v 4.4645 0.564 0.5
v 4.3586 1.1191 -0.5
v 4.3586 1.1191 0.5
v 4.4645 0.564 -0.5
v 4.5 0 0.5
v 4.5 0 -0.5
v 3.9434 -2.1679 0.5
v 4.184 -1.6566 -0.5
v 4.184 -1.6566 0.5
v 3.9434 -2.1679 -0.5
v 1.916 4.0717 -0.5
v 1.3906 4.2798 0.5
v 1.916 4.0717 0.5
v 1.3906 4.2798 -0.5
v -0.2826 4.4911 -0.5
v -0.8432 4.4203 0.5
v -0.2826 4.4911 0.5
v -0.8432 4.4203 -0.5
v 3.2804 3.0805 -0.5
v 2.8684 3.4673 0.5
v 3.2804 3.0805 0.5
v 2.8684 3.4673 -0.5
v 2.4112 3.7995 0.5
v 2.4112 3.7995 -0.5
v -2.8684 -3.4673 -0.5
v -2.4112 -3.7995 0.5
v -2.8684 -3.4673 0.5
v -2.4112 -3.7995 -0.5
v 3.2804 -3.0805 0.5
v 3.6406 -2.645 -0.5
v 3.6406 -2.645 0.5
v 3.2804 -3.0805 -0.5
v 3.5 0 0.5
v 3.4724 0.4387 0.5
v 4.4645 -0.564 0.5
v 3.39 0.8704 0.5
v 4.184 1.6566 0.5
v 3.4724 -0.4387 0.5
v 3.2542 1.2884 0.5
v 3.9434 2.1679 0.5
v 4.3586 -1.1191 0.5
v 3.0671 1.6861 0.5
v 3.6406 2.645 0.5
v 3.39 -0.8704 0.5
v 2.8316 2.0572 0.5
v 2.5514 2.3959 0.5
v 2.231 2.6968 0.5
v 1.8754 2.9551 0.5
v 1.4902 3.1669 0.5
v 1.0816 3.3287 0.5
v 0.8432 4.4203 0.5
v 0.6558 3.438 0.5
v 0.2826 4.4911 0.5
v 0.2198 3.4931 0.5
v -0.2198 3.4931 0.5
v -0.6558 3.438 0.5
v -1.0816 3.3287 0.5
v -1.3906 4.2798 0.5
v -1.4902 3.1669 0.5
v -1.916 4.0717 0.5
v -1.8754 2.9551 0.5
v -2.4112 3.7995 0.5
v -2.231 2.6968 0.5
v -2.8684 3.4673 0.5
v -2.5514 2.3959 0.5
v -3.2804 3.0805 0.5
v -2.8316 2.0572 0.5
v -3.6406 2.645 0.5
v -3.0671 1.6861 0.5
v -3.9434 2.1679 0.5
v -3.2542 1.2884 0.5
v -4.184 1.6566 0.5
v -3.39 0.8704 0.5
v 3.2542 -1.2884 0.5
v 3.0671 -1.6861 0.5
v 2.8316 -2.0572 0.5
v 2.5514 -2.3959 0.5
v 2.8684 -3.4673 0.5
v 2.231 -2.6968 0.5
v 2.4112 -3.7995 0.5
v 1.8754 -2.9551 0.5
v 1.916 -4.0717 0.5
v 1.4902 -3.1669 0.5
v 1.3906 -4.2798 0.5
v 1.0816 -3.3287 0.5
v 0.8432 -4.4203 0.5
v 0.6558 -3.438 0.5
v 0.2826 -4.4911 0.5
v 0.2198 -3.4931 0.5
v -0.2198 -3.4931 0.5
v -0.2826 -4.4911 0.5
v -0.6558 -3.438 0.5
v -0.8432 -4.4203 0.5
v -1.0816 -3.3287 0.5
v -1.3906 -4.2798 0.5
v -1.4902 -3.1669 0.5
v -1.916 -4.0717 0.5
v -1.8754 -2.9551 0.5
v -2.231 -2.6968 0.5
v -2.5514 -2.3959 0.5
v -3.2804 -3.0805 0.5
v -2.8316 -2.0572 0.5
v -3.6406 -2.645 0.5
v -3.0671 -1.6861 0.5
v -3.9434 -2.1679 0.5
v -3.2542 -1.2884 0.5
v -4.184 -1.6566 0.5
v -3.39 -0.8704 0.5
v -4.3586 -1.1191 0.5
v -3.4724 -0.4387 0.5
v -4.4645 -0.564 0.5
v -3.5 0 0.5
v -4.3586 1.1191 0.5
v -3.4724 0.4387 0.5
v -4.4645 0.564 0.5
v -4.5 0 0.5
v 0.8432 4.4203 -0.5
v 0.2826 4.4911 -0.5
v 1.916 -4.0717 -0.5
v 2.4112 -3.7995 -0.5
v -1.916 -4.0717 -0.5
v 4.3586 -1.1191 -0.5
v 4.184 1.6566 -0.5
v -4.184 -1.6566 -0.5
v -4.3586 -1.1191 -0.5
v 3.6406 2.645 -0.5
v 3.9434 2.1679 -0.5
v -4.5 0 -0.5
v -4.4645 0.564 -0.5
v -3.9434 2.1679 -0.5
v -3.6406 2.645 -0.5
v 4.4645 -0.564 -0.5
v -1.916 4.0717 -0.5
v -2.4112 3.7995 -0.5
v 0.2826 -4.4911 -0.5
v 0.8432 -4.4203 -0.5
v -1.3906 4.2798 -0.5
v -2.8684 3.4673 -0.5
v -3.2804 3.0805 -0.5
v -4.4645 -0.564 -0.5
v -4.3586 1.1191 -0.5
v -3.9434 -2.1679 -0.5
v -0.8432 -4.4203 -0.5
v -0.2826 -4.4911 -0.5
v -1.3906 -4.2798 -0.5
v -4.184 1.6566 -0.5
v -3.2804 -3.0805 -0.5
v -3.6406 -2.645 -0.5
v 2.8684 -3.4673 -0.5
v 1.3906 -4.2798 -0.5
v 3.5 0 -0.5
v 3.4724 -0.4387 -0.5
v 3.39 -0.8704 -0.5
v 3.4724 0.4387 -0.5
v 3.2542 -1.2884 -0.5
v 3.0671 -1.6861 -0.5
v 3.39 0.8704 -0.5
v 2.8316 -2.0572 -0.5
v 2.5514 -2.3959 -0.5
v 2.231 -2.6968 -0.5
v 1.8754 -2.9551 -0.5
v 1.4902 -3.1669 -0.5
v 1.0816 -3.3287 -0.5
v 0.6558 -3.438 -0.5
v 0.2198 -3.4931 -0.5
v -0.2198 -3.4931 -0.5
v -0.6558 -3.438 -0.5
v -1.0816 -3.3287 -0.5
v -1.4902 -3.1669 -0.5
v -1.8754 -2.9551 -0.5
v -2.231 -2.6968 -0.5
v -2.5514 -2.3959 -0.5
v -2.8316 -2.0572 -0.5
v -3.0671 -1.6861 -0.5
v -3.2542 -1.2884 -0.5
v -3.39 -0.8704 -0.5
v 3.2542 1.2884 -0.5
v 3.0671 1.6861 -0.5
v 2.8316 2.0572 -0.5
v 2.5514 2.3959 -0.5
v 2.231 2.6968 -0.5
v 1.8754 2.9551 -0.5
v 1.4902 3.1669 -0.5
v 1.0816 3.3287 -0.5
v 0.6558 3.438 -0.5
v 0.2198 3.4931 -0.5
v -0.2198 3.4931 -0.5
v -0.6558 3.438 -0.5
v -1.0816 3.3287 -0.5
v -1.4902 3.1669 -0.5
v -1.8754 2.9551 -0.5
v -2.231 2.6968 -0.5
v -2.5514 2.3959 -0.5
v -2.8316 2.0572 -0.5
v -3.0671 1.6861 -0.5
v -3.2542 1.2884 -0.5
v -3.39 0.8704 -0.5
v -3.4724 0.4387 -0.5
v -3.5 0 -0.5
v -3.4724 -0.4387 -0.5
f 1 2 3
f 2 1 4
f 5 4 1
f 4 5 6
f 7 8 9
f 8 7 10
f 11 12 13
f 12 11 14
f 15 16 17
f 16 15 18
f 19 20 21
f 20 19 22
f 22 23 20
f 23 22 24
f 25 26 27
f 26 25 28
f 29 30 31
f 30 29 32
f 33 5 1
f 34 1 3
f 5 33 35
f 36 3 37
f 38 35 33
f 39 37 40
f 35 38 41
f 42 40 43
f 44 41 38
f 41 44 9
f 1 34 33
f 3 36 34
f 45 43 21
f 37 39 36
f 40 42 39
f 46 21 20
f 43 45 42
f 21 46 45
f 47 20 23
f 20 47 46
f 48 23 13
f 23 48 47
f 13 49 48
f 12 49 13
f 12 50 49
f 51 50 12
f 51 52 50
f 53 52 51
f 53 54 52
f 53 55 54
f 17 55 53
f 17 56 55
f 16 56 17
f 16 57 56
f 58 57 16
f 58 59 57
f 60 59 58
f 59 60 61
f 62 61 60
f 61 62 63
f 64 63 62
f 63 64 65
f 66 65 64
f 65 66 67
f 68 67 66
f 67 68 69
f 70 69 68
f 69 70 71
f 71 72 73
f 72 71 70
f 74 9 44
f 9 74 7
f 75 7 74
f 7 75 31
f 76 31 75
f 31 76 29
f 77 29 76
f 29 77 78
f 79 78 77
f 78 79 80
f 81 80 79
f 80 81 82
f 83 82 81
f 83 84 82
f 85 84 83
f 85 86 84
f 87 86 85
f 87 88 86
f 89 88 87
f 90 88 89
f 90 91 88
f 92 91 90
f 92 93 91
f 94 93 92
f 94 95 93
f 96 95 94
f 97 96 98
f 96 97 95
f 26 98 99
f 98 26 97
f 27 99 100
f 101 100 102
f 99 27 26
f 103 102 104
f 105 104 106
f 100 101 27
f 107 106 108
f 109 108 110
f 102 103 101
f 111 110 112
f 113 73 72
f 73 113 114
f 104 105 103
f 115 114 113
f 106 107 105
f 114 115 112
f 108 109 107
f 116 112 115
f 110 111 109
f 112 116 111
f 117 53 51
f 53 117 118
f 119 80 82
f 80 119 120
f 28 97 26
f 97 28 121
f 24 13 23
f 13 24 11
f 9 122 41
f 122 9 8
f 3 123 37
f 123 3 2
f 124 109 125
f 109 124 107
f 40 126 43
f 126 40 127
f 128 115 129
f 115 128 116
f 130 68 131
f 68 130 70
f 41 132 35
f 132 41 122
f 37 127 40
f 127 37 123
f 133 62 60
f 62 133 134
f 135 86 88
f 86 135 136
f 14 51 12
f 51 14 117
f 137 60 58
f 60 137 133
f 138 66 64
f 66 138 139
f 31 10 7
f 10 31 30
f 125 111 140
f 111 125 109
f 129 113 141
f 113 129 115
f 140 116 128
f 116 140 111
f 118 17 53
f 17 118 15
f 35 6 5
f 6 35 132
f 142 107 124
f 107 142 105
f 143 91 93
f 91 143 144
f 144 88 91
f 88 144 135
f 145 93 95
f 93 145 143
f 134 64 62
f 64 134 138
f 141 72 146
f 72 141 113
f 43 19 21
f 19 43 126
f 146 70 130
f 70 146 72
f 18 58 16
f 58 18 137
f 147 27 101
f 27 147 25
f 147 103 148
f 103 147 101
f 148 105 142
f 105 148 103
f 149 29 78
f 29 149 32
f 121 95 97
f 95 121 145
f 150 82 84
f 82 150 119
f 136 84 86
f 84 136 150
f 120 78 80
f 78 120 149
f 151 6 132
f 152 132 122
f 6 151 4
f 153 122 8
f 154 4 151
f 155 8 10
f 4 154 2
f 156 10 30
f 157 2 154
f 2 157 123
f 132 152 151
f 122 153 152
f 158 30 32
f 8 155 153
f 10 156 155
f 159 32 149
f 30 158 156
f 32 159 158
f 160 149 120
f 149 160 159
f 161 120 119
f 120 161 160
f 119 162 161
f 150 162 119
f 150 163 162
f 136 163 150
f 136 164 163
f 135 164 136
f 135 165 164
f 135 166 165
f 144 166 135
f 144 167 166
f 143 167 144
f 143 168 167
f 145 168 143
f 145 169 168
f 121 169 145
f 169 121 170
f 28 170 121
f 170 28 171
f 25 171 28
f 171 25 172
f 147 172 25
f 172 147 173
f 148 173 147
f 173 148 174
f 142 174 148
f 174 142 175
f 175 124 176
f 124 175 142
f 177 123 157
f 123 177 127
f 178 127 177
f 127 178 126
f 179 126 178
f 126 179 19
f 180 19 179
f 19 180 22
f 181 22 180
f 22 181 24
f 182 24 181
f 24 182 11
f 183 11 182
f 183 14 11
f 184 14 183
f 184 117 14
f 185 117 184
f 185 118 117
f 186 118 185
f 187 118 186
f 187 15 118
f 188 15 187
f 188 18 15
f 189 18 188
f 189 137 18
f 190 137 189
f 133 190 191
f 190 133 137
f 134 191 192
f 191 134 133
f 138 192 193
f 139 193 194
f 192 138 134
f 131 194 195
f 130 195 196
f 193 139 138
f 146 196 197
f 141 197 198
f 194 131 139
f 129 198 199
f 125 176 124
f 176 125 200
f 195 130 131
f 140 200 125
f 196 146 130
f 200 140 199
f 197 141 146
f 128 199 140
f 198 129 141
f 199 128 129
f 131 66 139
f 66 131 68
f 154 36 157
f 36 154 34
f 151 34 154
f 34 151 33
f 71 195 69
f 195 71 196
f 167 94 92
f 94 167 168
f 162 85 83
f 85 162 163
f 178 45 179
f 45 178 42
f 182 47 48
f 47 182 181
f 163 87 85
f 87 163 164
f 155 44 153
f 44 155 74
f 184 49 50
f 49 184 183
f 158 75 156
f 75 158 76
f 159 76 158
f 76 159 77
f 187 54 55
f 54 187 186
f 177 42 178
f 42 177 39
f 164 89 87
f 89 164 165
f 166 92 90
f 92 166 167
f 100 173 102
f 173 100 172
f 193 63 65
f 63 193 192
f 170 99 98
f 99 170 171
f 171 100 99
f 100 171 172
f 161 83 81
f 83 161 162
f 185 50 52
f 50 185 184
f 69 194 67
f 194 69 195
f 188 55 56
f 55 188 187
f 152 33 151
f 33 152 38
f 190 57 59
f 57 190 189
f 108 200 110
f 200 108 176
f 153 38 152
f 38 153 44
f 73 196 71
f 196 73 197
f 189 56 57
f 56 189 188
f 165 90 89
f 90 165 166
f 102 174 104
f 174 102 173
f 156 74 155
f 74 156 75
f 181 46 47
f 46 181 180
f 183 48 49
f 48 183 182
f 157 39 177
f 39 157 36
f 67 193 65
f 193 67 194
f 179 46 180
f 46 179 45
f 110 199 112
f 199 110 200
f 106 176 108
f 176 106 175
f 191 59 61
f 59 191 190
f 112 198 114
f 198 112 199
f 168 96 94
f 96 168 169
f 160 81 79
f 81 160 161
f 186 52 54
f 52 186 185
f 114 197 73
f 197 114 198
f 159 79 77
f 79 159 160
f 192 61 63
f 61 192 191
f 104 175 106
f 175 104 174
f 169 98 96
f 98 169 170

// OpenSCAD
$fn = 50;


difference() {
	union() {
		translate(v = [0, 0, -0.5000000000]) {
			cylinder(h = 1, r = 4.5000000000);
		}
	}
	union() {
		translate(v = [0, 0, -100.0000000000]) {
			cylinder(h = 200, r = 3.5000000000);
		}
	}
}
